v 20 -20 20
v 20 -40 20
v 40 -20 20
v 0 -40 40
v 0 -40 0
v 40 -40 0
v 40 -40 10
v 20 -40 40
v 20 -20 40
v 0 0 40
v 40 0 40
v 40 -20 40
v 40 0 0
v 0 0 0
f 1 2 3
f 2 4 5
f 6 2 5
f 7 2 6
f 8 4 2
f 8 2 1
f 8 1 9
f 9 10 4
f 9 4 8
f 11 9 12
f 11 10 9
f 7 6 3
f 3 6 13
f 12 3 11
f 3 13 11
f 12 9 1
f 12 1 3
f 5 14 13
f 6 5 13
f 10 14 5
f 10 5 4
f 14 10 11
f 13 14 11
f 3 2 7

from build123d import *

# Parameters (mm, degrees)
F0_W     = 40
F0_H     = 40
F1_DEPTH = 40
F2_W     = 20
F2_H     = 20
F3_DEPTH = 20
F7_DEPTH = 24.4958974278


with BuildPart() as f1:
    # F0 (on Front) → F1 (new body)
    with BuildSketch(Plane.XZ):
        with Locations((20, 20)):
            Rectangle(F0_W, F0_H)
    extrude(amount=F1_DEPTH)

    # F2 (on face) → F3 (cut)
    with BuildSketch(Plane.XZ.offset(40)):
        with Locations((30, 30)):
            Rectangle(F2_W, F2_H)
    extrude(amount=-F3_DEPTH, mode=Mode.SUBTRACT)

    # F6 (on 3pt) → F7 (cut, through all)
    with BuildSketch(Plane(origin=(16.6666666667, -16.6666666667, 33.3333333333), x_dir=(0.9128709292, 0.1825741858, -0.3651483717), z_dir=(-0.4082482905, 0.4082482905, -0.8164965809))):
        Polygon((3.6514837167, 26.83281573), (25.5603860169, 8.94427191), (25.5603860169, 31.304951685), align=None)
    extrude(amount=-F7_DEPTH, mode=Mode.SUBTRACT)


solid = f1.part
